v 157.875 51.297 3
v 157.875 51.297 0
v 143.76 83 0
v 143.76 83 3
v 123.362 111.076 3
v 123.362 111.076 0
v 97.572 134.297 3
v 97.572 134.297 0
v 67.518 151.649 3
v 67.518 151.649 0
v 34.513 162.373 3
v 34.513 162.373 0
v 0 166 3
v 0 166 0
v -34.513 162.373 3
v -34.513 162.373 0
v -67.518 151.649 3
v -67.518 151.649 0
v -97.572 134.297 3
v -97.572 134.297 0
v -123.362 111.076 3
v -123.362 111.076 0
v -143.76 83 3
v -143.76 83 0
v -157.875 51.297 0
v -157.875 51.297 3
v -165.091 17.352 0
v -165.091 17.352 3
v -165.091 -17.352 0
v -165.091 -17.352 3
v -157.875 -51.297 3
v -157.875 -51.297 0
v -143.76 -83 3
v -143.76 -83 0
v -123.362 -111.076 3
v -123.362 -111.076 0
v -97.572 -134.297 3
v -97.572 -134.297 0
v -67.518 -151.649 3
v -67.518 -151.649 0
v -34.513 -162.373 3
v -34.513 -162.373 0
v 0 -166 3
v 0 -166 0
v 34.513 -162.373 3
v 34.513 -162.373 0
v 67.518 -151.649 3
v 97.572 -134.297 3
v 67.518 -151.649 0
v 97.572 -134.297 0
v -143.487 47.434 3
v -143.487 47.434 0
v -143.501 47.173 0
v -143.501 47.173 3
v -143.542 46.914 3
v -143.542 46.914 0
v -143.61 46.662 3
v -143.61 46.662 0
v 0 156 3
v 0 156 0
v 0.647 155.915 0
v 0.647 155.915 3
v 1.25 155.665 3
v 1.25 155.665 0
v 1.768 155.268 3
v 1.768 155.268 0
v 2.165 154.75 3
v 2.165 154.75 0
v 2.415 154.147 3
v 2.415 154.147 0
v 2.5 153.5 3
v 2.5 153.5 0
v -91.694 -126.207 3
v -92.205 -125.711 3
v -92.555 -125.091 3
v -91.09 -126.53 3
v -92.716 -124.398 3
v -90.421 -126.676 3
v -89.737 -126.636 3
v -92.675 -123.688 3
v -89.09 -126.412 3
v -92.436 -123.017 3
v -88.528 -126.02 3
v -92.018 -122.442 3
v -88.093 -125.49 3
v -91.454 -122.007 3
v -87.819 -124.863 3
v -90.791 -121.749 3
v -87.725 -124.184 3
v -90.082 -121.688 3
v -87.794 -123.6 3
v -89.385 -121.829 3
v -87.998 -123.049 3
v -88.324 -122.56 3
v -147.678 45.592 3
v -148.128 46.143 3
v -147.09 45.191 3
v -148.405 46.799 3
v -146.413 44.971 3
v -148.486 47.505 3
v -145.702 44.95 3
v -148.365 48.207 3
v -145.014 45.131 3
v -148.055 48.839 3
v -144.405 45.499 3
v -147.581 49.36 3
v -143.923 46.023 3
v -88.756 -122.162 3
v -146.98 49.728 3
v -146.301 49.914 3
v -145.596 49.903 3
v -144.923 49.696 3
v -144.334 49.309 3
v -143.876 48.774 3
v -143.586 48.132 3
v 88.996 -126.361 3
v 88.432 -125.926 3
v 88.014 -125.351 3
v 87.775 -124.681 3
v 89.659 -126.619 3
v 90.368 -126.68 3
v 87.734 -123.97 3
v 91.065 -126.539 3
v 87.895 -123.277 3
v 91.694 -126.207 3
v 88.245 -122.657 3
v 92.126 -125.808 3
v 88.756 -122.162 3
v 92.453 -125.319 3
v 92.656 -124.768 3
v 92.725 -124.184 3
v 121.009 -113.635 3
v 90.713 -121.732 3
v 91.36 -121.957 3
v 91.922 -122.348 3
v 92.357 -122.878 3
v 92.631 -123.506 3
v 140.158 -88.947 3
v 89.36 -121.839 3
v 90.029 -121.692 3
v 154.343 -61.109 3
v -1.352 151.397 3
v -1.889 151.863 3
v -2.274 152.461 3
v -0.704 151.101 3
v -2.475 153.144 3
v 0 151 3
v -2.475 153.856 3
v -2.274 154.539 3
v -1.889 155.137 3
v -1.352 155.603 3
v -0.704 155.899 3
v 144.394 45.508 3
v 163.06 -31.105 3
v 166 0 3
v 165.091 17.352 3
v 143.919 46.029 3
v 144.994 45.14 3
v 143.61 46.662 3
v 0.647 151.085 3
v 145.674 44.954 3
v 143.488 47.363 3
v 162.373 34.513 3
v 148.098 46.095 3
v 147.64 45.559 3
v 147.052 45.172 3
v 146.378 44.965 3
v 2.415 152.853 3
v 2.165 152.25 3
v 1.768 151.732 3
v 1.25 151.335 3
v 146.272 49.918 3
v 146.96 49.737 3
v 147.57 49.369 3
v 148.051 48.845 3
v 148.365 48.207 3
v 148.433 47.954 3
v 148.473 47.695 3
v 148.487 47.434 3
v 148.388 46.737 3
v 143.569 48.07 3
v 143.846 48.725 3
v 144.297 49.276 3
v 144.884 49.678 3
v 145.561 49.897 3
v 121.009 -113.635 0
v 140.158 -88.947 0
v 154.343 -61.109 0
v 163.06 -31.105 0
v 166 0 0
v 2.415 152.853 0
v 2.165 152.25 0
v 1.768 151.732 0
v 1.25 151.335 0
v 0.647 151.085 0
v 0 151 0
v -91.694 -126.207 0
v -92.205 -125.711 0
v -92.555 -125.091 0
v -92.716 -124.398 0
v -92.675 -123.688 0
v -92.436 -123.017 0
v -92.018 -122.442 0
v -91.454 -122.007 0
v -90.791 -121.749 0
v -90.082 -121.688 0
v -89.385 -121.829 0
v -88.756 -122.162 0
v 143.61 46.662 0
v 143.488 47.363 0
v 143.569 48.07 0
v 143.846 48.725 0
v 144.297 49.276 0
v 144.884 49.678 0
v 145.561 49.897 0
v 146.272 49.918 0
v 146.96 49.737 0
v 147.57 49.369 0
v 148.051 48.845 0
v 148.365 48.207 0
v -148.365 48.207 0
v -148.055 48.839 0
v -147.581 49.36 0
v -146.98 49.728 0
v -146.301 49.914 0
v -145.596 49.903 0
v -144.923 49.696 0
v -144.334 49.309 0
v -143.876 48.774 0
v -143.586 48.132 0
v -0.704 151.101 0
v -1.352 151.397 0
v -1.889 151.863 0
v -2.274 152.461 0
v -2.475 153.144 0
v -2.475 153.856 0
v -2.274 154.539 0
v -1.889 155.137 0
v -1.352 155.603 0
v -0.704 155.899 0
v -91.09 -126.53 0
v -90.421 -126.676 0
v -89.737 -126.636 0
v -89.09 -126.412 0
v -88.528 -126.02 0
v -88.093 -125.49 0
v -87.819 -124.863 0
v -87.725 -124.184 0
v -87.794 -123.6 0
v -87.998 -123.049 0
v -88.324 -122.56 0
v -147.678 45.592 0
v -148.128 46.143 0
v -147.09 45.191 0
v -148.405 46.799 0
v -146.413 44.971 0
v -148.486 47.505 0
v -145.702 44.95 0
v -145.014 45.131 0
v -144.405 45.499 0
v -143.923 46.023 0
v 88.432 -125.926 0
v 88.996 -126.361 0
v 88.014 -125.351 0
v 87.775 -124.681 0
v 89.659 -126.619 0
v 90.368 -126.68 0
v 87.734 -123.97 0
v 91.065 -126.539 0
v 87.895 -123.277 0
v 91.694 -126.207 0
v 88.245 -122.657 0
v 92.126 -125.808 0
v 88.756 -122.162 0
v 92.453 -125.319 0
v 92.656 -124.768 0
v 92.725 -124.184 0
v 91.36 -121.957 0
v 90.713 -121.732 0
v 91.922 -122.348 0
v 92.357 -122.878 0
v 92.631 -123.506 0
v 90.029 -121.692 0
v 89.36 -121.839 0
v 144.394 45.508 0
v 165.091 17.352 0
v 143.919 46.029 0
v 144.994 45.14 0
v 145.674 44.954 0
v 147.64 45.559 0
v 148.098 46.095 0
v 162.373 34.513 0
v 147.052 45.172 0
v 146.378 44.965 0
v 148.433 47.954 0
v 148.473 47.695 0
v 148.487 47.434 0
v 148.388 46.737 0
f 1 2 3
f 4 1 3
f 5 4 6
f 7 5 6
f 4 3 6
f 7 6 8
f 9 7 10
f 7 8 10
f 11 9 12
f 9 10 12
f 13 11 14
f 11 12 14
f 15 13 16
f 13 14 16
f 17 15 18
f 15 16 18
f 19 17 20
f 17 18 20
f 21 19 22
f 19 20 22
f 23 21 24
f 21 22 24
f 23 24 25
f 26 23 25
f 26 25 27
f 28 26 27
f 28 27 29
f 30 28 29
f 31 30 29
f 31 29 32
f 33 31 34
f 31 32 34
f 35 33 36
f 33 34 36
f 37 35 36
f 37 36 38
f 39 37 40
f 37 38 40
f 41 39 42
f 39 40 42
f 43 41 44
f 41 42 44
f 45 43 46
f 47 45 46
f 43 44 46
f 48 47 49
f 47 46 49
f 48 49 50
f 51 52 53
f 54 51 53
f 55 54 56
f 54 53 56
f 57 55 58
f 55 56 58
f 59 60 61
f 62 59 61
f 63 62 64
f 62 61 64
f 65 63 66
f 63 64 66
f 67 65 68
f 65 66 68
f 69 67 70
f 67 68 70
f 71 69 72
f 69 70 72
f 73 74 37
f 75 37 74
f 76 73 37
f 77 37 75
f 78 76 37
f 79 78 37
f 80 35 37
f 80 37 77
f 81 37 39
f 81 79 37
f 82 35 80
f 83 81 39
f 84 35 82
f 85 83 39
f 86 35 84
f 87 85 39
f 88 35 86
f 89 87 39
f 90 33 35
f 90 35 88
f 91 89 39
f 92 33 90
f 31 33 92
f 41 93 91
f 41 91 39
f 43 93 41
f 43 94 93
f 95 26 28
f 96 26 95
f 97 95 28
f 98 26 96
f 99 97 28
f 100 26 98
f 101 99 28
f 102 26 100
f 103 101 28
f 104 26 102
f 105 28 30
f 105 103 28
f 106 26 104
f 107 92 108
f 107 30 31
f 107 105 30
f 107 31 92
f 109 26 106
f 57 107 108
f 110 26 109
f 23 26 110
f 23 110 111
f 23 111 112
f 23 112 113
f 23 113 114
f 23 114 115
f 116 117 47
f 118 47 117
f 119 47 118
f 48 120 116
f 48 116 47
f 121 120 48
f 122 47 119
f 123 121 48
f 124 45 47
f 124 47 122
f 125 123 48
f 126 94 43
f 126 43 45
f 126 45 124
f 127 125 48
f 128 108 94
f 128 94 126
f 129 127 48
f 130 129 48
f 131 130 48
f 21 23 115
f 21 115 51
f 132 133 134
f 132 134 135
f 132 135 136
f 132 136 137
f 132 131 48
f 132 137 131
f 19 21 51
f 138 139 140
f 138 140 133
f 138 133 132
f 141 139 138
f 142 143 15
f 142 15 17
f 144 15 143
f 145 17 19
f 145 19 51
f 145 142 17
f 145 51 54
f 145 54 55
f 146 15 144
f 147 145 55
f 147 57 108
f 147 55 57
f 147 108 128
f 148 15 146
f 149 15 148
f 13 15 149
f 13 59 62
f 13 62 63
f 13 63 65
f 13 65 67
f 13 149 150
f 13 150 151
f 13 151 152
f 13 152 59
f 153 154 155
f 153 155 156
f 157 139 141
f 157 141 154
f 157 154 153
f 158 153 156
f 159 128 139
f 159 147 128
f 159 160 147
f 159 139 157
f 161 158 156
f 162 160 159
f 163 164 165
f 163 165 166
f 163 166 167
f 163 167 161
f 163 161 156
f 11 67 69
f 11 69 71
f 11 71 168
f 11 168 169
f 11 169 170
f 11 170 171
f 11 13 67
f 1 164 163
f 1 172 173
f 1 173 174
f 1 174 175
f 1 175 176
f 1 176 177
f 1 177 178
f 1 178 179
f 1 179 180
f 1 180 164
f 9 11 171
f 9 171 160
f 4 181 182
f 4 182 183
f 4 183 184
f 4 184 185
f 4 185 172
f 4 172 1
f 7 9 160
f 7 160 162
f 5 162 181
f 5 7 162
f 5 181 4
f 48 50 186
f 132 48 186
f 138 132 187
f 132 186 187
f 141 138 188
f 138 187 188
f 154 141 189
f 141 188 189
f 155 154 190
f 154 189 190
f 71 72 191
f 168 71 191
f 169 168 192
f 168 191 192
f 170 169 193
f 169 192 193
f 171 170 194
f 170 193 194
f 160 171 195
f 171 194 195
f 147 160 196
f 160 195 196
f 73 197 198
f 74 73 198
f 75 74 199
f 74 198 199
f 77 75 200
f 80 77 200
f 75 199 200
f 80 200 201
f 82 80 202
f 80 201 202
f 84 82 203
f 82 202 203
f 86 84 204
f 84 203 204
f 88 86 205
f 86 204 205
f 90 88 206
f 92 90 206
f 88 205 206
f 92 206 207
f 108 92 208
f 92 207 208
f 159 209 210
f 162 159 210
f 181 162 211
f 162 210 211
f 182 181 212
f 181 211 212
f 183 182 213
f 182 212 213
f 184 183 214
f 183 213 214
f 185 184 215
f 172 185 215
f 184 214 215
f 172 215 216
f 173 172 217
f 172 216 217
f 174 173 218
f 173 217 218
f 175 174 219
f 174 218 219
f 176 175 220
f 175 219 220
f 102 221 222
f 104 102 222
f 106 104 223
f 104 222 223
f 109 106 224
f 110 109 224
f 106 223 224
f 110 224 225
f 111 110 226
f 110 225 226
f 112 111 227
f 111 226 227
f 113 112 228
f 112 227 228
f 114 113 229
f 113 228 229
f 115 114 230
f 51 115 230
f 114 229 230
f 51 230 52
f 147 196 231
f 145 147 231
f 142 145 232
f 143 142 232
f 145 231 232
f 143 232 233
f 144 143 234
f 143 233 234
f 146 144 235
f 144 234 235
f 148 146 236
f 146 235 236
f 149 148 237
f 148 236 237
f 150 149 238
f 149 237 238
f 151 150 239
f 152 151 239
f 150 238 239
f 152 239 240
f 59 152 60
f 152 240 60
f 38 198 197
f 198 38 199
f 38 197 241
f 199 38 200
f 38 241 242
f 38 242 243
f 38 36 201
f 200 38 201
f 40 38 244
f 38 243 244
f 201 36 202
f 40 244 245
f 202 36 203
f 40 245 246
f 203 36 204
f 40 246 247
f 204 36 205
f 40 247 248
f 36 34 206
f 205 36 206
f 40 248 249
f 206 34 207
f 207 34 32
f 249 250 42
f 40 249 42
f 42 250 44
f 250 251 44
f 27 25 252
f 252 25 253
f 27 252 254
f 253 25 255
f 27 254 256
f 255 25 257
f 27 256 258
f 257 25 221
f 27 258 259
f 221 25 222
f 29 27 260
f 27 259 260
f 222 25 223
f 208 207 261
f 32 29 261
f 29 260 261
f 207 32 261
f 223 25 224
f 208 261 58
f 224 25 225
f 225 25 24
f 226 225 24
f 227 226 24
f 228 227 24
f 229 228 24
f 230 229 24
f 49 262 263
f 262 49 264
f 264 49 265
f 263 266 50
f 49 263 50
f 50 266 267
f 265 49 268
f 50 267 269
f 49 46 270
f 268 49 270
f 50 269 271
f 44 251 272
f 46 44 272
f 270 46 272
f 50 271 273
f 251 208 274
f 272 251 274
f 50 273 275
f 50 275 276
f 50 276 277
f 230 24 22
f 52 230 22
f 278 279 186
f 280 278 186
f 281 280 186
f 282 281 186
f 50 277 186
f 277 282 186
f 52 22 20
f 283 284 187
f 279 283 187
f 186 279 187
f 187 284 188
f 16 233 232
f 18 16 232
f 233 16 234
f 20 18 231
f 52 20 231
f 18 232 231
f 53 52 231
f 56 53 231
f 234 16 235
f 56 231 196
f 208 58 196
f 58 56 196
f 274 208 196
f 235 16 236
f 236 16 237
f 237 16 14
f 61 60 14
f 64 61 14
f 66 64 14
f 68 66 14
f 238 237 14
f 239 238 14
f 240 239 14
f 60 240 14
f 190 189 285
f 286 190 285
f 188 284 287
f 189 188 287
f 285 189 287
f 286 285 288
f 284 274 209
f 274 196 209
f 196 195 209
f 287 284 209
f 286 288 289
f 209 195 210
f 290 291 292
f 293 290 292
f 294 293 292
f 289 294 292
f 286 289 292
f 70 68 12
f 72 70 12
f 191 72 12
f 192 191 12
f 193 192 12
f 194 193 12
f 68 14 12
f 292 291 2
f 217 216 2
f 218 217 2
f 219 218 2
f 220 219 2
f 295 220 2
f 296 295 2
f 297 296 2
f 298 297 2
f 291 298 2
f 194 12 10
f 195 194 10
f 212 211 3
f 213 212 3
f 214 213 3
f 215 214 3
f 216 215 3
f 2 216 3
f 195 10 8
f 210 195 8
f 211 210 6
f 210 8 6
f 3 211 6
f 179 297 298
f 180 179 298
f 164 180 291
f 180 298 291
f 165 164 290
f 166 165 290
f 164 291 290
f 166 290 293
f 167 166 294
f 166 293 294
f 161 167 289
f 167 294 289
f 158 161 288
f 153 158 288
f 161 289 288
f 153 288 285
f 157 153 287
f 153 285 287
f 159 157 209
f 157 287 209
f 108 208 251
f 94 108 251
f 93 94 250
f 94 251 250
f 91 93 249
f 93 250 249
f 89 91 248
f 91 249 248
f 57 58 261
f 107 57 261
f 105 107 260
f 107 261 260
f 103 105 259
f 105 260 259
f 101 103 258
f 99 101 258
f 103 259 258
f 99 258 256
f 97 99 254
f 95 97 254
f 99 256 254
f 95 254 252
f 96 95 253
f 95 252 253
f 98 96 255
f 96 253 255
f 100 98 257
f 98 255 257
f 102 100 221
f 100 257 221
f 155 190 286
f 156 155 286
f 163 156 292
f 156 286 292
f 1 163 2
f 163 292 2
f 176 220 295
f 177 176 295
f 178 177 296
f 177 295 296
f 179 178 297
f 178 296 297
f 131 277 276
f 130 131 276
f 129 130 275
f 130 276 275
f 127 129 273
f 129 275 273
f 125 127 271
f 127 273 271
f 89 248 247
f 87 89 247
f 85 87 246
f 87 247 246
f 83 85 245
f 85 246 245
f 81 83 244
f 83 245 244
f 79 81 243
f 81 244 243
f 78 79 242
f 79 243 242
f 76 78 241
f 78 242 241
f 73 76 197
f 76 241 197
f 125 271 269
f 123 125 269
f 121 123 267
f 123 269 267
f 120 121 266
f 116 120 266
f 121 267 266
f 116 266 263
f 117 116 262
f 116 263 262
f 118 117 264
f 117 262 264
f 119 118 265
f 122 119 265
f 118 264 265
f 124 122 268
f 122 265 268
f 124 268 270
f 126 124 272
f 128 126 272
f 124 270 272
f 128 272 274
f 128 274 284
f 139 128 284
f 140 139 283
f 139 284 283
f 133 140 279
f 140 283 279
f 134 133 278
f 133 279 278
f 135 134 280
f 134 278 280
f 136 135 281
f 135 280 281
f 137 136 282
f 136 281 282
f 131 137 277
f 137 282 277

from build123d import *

# Parameters (mm, degrees)
F1_DEPTH = 3


with BuildPart() as f1:
    # F0 (on Top) → F1 (new body)
    with BuildSketch(Plane.XY):
        with BuildLine():
            Line((148.364816542, 48.2066511225), (157.875381705, 51.2968210662))
            ThreePointArc((157.875381705, 51.2968210662), (97.5723518806, 134.2968210662), (0, 166))
            Line((0, 166), (0, 156))
            ThreePointArc((0, 156), (1.767766953, 155.267766953), (2.5, 153.5))
            ThreePointArc((2.5, 153.5), (1.767766953, 151.732233047), (0, 151))
            Line((0, 151), (0, 0))
            Line((0, 0), (143.6095339606, 46.6615661506))
            ThreePointArc((143.6095339606, 46.6615661506), (145.2146327654, 49.8117499273), (148.364816542, 48.2066511225))
        make_face()
        with BuildLine():
            ThreePointArc((97.5723518806, -134.2968210662), (147.9070830153, -75.3624229568), (166, 0))
            ThreePointArc((166, 0), (163.9562645388, 25.9681211967), (157.875381705, 51.2968210662))
            Line((157.875381705, 51.2968210662), (148.364816542, 48.2066511225))
            ThreePointArc((148.364816542, 48.2066511225), (148.4563961028, 47.8251947992), (148.4871752513, 47.4341086366))
            ThreePointArc((148.4871752513, 47.4341086366), (146.3782614139, 44.9648877851), (143.6095339606, 46.6615661506))
            Line((143.6095339606, 46.6615661506), (0, 0))
            Line((0, 0), (88.7555730962, -122.1615661506))
            ThreePointArc((88.7555730962, -122.1615661506), (91.3600124762, -121.9565923261), (92.7250362269, -124.1841086366))
            ThreePointArc((92.7250362269, -124.1841086366), (92.4525525374, -125.3190848859), (91.6944993576, -126.2066511225))
            Line((91.6944993576, -126.2066511225), (97.5723518806, -134.2968210662))
        make_face()
        with BuildLine():
            ThreePointArc((-97.5723518806, -134.2968210662), (0, -166), (97.5723518806, -134.2968210662))
            Line((97.5723518806, -134.2968210662), (91.6944993576, -126.2066511225))
            ThreePointArc((91.6944993576, -126.2066511225), (88.202493741, -125.6535717673), (88.7555730962, -122.1615661506))
            Line((88.7555730962, -122.1615661506), (0, 0))
            Line((0, 0), (-88.7555730962, -122.1615661506))
            ThreePointArc((-88.7555730962, -122.1615661506), (-87.9975199164, -123.0491323872), (-87.7250362269, -124.1841086366))
            ThreePointArc((-87.7250362269, -124.1841086366), (-89.0900599775, -126.411624947), (-91.6944993576, -126.2066511225))
            Line((-91.6944993576, -126.2066511225), (-97.5723518806, -134.2968210662))
        make_face()
        with BuildLine():
            ThreePointArc((-157.875381705, 51.2968210662), (-157.875381705, -51.2968210662), (-97.5723518806, -134.2968210662))
            Line((-97.5723518806, -134.2968210662), (-91.6944993576, -126.2066511225))
            ThreePointArc((-91.6944993576, -126.2066511225), (-92.2475787128, -122.7146455058), (-88.7555730962, -122.1615661506))
            Line((-88.7555730962, -122.1615661506), (0, 0))
            Line((0, 0), (-143.6095339606, 46.6615661506))
            ThreePointArc((-143.6095339606, 46.6615661506), (-146.7597177372, 45.0564673458), (-148.364816542, 48.2066511225))
            Line((-148.364816542, 48.2066511225), (-157.875381705, 51.2968210662))
        make_face()
        with BuildLine():
            Line((0, 156), (0, 166))
            ThreePointArc((0, 166), (-97.5723518806, 134.2968210662), (-157.875381705, 51.2968210662))
            Line((-157.875381705, 51.2968210662), (-148.364816542, 48.2066511225))
            ThreePointArc((-148.364816542, 48.2066511225), (-145.5960890887, 49.903329488), (-143.4871752513, 47.4341086366))
            ThreePointArc((-143.4871752513, 47.4341086366), (-143.5179543998, 47.043022474), (-143.6095339606, 46.6615661506))
            Line((-143.6095339606, 46.6615661506), (0, 0))
            Line((0, 0), (0, 151))
            ThreePointArc((0, 151), (-2.5, 153.5), (0, 156))
        make_face()
    extrude(amount=F1_DEPTH)


solid = f1.part
